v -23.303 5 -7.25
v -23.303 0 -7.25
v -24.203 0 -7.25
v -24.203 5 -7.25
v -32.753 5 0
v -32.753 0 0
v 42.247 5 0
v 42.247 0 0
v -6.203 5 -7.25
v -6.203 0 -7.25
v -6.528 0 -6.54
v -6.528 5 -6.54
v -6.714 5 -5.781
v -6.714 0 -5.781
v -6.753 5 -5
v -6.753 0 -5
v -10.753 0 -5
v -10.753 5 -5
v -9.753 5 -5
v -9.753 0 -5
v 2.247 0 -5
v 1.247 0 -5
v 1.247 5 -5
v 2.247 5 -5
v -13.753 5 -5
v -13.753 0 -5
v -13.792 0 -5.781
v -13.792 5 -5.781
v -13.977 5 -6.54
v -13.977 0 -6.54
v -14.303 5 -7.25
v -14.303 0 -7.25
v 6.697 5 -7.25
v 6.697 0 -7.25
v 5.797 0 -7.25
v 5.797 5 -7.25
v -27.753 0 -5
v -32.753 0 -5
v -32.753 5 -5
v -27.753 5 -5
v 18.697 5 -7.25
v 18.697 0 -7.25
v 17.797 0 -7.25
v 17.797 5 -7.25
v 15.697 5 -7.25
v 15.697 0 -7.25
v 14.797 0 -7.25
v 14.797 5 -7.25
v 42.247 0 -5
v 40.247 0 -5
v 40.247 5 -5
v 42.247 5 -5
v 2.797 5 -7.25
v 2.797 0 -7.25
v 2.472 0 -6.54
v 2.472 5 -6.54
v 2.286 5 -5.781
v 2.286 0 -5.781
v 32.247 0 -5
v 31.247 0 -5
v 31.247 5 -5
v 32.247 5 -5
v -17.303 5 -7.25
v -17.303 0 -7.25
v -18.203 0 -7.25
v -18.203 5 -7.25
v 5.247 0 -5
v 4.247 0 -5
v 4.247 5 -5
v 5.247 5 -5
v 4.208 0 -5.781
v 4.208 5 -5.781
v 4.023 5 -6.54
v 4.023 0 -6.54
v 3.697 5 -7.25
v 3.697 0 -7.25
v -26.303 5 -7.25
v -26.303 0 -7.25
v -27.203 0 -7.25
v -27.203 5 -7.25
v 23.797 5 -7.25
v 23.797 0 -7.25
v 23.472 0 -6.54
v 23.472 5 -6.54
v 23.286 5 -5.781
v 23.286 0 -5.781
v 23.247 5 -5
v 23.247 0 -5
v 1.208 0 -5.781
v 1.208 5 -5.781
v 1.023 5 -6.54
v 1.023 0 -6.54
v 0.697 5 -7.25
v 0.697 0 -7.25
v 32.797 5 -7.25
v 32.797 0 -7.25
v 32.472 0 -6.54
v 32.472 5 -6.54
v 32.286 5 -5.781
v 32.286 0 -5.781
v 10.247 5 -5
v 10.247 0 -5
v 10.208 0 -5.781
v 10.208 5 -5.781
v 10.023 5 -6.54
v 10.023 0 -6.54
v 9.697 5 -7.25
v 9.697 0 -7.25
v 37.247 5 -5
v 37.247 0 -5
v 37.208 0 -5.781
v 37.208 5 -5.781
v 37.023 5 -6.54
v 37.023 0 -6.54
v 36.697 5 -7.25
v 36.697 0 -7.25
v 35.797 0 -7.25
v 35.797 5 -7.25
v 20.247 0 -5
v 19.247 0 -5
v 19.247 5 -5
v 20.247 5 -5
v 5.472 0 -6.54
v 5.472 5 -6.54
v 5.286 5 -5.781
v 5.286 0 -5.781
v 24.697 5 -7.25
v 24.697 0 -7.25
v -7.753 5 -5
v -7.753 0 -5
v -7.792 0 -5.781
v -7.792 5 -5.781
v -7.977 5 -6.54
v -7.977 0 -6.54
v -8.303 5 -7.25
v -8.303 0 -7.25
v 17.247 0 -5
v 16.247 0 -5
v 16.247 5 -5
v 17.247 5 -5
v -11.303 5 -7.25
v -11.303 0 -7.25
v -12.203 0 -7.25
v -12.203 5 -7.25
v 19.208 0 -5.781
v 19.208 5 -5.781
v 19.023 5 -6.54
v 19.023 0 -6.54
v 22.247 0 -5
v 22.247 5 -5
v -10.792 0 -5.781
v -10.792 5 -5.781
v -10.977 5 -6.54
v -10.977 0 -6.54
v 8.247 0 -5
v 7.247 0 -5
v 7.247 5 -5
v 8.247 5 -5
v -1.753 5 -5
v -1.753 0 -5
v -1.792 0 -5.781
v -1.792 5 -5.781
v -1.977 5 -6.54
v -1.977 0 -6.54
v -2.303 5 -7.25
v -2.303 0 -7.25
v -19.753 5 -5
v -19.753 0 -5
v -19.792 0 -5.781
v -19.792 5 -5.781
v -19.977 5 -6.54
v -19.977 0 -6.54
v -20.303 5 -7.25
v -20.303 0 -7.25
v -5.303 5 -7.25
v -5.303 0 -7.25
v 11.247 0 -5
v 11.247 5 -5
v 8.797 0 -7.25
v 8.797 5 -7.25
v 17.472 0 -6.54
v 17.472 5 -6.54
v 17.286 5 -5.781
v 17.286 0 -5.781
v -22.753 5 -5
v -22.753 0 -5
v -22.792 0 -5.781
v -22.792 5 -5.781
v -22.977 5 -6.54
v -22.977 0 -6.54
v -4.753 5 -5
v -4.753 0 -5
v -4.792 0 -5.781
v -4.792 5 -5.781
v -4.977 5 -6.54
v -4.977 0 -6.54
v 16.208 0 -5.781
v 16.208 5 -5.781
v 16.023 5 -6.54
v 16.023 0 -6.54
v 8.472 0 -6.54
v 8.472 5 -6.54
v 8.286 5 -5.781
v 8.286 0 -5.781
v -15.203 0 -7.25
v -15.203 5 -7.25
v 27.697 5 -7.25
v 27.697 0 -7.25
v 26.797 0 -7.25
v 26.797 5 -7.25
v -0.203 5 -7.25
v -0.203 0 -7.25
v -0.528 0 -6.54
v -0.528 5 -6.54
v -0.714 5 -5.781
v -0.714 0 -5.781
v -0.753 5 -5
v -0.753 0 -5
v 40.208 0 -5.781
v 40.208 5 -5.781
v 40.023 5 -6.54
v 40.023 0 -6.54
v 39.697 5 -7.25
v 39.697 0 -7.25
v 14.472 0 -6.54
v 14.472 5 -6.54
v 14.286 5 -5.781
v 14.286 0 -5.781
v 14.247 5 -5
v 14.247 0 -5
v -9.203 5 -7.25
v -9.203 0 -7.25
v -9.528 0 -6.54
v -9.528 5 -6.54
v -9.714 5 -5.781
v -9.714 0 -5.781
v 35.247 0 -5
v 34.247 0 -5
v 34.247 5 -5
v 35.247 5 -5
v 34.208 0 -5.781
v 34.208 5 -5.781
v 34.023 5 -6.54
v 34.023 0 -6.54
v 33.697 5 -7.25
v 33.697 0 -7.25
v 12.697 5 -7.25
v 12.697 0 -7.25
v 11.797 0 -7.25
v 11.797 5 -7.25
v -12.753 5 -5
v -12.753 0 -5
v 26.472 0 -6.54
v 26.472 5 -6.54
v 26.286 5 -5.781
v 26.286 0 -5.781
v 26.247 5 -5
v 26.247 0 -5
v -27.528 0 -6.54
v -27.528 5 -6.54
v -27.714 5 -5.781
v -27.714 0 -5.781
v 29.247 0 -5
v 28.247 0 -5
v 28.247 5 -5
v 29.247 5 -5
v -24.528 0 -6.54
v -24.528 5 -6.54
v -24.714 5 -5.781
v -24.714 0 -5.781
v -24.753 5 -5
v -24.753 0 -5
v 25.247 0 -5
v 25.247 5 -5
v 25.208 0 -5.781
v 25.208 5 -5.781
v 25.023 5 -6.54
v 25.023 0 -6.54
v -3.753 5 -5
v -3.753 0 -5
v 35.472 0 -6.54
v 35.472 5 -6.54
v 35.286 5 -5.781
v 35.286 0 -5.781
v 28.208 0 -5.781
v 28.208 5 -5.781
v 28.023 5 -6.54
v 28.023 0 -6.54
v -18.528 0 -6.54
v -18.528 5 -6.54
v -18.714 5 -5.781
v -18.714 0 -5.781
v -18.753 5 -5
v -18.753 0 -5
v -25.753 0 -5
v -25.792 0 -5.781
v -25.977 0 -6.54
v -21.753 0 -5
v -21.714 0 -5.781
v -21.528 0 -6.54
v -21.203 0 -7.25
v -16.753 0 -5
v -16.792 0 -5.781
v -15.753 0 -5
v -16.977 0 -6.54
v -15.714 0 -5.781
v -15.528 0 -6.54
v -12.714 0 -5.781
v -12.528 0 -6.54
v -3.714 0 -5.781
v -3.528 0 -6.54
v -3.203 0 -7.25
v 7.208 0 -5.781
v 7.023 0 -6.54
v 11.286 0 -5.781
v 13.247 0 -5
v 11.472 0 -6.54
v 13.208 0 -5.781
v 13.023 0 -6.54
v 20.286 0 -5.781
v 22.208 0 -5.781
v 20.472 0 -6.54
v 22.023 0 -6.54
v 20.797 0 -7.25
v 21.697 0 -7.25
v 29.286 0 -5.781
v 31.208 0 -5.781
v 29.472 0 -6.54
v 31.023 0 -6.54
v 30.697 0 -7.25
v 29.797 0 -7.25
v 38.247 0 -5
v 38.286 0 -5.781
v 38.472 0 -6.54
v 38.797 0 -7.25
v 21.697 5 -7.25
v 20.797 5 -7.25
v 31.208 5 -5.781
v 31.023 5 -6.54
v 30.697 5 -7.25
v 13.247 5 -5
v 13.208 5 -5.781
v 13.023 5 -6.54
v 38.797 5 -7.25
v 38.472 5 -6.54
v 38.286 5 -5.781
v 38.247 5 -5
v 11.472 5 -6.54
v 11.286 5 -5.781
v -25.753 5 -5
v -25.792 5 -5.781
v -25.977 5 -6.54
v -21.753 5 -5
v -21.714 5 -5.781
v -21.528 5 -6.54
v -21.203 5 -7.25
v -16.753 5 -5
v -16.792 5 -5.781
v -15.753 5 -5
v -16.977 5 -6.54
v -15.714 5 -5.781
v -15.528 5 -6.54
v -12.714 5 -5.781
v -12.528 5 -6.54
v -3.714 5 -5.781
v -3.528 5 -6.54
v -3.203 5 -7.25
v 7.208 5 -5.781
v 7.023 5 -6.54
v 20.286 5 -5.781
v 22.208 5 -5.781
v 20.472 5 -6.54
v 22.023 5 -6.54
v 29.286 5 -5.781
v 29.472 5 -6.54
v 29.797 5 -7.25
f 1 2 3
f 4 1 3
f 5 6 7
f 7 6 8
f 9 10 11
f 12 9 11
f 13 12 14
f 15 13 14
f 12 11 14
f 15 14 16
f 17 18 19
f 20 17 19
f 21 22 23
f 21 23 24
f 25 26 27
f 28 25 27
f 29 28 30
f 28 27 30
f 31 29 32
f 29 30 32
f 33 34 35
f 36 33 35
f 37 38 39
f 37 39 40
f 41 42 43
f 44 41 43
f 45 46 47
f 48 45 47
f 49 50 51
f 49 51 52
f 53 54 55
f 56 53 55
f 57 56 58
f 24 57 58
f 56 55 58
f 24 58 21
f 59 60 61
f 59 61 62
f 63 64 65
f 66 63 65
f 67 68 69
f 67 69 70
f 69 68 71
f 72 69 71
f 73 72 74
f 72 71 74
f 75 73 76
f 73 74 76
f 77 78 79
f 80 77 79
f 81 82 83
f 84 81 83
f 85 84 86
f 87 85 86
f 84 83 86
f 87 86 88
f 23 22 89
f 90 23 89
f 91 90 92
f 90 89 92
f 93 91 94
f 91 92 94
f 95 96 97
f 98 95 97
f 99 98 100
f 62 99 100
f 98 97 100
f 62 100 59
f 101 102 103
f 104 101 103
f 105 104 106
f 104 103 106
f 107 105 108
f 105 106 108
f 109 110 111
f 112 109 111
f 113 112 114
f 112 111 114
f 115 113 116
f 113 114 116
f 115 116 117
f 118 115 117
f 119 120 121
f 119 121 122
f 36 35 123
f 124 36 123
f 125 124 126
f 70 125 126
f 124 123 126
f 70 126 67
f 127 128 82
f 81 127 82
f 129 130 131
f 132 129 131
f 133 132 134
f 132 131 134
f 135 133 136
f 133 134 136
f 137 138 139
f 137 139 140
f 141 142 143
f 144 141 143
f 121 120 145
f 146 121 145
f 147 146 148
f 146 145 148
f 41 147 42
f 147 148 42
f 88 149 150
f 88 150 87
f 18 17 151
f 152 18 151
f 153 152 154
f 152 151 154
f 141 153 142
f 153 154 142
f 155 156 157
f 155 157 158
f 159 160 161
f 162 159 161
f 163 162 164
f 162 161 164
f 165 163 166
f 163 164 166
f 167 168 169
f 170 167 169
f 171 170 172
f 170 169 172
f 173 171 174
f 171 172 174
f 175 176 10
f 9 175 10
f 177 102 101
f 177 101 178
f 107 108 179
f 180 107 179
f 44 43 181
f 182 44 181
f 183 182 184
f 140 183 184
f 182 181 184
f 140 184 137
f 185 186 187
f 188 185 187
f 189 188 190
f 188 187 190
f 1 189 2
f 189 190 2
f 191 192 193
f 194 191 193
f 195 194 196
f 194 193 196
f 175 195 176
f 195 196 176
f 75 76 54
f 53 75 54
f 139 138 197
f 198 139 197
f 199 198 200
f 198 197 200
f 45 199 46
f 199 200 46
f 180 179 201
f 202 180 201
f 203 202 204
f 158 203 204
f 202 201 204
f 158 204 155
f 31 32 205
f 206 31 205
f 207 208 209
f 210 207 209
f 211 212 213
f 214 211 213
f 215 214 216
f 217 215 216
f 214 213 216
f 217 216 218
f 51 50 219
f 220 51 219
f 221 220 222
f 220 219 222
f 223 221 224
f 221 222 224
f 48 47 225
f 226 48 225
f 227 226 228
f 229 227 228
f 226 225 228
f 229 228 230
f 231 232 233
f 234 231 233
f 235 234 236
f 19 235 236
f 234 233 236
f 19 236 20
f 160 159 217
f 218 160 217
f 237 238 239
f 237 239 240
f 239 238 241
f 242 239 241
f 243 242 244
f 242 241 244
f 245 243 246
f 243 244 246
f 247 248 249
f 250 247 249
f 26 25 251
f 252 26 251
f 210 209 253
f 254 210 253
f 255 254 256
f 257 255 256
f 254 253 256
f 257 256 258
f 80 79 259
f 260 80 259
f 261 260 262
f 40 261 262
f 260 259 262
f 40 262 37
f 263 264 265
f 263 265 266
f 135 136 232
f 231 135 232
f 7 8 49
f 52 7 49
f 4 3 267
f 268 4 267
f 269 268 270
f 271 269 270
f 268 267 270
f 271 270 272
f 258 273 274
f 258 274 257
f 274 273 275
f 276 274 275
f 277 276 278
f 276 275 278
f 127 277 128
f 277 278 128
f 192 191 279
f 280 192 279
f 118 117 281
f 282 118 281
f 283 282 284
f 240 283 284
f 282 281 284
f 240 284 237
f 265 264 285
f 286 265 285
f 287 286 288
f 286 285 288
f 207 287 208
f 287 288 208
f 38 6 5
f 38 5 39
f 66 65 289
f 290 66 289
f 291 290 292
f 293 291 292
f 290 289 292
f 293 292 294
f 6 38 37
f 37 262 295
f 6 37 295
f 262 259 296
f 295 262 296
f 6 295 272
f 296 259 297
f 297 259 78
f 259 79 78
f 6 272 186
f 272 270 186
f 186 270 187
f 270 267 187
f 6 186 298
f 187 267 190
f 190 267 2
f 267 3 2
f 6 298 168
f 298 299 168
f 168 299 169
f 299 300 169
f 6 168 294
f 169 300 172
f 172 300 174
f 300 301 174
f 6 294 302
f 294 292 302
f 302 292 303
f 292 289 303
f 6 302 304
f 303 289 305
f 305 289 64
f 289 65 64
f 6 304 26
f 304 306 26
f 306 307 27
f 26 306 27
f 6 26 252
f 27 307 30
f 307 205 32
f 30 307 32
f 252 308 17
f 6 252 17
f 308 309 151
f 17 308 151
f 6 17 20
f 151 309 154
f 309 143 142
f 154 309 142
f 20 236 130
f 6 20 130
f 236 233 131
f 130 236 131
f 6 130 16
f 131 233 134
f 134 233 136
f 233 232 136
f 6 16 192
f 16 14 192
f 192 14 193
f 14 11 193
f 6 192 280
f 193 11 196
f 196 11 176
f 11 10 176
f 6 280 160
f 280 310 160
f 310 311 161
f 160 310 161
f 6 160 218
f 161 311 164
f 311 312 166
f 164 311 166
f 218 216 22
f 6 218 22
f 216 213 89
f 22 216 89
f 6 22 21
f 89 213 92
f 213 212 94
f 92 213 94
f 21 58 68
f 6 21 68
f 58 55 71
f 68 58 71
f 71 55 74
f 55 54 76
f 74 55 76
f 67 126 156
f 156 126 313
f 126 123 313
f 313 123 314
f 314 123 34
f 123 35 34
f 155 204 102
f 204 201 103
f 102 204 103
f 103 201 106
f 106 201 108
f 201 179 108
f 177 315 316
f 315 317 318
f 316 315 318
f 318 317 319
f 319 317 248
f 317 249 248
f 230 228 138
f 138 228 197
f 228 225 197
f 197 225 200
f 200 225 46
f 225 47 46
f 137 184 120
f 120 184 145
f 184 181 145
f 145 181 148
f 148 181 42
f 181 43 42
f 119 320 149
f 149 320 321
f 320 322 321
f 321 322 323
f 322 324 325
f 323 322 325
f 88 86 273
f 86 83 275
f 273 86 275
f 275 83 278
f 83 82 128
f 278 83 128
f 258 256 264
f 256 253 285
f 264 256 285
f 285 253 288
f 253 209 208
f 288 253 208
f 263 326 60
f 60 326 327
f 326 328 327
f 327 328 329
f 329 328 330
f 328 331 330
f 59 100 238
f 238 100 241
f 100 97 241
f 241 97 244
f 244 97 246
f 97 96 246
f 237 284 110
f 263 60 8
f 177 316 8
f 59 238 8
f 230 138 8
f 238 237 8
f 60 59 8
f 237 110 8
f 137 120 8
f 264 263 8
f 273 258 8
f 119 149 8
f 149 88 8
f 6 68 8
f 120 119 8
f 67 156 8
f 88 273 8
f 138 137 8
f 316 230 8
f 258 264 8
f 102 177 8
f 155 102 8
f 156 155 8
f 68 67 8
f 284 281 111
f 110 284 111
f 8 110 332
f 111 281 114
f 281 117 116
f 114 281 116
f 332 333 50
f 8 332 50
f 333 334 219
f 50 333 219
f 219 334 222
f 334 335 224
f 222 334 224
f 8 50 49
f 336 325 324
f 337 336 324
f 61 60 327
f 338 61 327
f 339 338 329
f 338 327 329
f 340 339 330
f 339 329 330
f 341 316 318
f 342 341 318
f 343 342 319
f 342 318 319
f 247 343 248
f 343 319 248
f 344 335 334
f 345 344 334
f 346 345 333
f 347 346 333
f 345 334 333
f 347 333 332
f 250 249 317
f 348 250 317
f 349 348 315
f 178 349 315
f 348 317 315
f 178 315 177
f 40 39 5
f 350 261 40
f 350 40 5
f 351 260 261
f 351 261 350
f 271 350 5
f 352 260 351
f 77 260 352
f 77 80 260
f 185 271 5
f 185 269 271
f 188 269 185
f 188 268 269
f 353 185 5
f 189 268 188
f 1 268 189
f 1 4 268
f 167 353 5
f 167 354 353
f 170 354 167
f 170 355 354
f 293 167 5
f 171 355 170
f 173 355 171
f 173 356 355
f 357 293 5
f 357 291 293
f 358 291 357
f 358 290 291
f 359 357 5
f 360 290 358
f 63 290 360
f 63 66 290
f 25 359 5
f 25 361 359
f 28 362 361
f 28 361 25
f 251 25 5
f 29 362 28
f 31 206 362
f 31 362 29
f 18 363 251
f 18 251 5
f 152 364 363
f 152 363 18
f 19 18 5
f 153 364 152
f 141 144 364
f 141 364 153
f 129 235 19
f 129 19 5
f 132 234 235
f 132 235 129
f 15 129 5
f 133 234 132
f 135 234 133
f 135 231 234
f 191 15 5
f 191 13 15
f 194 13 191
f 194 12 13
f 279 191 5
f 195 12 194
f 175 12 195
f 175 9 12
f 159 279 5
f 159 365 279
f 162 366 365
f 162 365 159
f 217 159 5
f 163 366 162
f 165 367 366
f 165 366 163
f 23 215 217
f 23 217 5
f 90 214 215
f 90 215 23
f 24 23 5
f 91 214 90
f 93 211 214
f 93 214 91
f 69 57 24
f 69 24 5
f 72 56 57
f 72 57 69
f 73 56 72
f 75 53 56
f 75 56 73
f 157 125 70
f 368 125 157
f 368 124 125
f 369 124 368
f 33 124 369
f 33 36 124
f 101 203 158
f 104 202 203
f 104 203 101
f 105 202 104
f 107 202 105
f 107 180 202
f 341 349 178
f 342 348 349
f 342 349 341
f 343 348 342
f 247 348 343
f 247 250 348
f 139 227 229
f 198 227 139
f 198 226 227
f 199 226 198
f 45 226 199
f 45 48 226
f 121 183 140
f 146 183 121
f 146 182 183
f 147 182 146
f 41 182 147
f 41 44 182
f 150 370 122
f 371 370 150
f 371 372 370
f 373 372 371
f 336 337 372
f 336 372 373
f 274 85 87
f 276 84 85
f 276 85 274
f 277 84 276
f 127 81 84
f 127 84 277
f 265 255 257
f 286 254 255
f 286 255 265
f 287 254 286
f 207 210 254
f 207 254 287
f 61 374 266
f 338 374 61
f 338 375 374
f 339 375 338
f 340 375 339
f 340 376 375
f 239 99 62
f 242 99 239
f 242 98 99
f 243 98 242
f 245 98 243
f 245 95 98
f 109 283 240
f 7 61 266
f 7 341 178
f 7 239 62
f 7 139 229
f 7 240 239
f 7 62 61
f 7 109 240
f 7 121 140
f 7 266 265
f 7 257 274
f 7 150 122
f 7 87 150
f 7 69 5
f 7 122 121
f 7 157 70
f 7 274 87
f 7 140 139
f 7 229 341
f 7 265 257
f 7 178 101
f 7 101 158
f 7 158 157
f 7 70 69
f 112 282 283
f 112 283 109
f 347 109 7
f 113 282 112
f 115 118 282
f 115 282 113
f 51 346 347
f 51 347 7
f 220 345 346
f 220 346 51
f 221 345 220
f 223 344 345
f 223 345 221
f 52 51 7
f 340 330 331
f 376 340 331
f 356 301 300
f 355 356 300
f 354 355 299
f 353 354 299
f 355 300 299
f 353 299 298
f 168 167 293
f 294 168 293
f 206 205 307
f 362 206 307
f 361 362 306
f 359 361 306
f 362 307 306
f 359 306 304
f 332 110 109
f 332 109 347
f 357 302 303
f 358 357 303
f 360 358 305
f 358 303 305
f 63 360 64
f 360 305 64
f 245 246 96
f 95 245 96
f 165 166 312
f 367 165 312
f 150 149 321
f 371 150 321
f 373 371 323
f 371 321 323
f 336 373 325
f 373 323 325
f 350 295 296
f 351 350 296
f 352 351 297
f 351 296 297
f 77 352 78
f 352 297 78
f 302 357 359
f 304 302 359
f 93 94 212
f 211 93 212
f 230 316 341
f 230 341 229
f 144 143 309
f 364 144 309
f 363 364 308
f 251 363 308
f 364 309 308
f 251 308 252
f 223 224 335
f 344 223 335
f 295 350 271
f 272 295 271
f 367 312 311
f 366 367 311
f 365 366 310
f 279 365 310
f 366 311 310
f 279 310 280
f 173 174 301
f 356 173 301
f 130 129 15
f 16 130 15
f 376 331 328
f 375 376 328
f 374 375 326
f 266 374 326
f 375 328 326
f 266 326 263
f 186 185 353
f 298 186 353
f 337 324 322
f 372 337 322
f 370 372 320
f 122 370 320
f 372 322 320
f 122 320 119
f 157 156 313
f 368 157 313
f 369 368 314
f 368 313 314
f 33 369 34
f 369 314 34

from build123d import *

# Parameters (mm, degrees)
BOSS_EXTRUDE1_DEPTH = 5
BOSS_EXTRUDE2_DEPTH = 5
LPATTERN1_COUNT     = 23
LPATTERN1_PITCH     = 3


with BuildPart() as part:
    # Sketch2 → Boss-Extrude1 (new body)
    with BuildSketch(Plane(origin=(0, 0, 0), x_dir=(1, 0, 0), z_dir=(0, 1, 0))):
        Polygon((-32.752808989, 5), (-32.752808989, 0), (42.247191011, 0), (42.247191011, 5), (-25.752808989, 5), (-27.752808989, 5), align=None)
    extrude(amount=BOSS_EXTRUDE1_DEPTH)

    # Sketch2<3> → Boss-Extrude2 (add)
    with BuildSketch(Plane(origin=(0, 0, 0), x_dir=(1, 0, 0), z_dir=(0, 1, 0))):
        with BuildLine():
            ThreePointArc((-27.202808989, 7.25), (-27.639277587, 6.164470102), (-27.752808989, 5))
            Line((-27.752808989, 5), (-25.752808989, 5))
            ThreePointArc((-25.752808989, 5), (-25.86634039, 6.164470102), (-26.302808989, 7.25))
            Line((-26.302808989, 7.25), (-27.202808989, 7.25))
        make_face()
    boss_extrude2 = extrude(amount=BOSS_EXTRUDE2_DEPTH)

    # LPattern1: Boss-Extrude2 ×23
    with Locations(*[(i * LPATTERN1_PITCH, 0, 0) for i in range(1, LPATTERN1_COUNT)]):
        add(boss_extrude2)


solid = part.part
